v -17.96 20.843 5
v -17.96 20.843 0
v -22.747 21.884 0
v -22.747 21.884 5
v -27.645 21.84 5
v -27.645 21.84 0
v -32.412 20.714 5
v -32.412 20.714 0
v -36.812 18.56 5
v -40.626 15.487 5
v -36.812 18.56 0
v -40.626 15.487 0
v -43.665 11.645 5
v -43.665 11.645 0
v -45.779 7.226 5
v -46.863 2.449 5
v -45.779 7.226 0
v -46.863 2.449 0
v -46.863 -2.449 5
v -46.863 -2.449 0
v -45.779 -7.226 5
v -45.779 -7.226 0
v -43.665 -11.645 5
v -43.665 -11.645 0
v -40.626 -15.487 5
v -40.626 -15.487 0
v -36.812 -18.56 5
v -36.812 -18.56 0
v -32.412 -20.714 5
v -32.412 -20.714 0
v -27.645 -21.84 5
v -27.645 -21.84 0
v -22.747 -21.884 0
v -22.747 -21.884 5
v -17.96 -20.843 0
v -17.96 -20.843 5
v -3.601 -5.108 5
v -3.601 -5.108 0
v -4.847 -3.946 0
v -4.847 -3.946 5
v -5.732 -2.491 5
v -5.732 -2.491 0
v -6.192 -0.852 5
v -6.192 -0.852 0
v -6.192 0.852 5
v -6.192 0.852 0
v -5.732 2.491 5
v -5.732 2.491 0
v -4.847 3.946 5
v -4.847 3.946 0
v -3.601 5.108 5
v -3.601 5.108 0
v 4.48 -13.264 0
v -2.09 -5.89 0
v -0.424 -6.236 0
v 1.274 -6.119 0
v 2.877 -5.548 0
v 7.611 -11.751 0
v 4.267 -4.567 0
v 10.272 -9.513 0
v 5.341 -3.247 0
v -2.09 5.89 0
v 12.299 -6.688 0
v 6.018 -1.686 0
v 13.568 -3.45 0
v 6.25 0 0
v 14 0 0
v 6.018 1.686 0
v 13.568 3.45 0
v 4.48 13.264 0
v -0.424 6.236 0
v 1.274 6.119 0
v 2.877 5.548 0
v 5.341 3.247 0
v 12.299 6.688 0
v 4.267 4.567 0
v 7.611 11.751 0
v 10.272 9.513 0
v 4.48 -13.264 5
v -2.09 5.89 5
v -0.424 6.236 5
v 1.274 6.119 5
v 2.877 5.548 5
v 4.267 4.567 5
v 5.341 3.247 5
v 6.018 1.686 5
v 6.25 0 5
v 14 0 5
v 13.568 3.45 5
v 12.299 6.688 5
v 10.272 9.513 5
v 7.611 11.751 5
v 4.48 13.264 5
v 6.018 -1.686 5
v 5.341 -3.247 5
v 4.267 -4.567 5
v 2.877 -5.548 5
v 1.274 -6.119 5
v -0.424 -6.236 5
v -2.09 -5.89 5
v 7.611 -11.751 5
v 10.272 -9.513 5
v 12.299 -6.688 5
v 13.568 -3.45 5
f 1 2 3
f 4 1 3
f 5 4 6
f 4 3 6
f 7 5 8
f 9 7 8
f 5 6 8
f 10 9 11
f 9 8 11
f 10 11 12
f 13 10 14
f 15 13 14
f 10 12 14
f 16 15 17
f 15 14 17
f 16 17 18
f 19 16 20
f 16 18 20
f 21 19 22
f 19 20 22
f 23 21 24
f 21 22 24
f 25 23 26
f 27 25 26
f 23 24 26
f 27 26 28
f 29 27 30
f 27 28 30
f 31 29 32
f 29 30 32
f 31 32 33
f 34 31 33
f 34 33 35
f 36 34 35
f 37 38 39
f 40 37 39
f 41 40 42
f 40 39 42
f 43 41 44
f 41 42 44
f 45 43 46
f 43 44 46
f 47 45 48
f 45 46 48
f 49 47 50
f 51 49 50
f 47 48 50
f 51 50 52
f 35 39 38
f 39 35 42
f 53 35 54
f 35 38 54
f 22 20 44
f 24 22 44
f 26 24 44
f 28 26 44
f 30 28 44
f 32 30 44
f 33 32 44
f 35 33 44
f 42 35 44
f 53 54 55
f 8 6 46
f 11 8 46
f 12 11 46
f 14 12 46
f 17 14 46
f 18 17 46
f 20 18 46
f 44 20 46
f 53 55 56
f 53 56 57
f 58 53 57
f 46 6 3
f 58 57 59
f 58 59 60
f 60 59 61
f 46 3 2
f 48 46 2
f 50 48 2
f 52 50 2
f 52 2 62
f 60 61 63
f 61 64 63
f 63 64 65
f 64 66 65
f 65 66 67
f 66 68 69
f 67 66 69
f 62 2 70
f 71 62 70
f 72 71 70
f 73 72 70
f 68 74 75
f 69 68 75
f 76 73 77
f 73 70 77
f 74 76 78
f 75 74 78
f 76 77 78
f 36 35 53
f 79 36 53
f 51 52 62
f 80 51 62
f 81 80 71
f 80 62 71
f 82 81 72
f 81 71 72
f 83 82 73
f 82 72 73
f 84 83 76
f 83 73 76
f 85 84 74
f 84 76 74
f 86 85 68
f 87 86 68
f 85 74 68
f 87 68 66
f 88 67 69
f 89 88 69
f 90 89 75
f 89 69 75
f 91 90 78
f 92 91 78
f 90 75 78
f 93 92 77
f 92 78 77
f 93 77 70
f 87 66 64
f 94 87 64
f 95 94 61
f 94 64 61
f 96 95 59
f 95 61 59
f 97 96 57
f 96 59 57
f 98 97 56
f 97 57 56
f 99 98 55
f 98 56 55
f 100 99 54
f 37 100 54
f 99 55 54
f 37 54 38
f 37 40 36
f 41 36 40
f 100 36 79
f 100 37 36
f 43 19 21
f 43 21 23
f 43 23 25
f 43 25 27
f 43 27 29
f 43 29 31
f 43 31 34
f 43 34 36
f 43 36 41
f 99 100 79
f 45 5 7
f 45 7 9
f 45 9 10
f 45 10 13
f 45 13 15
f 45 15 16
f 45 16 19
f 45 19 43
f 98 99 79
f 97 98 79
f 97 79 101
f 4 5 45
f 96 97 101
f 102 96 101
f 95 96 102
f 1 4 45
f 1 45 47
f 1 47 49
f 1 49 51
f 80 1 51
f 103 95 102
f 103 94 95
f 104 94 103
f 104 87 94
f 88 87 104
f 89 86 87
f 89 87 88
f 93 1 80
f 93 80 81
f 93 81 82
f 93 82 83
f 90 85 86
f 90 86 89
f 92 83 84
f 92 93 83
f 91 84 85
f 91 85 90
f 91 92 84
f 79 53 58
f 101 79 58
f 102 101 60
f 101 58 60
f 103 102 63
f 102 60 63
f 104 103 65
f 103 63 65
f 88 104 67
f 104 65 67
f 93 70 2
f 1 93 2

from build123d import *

# Parameters (mm, degrees)
F1_DEPTH = 5


with BuildPart() as f1:
    # F0 (on Top) → F1 (new body)
    with BuildSketch(Plane.XY):
        with BuildLine():
            ThreePointArc((-6.74, -12.2707945953), (-14, 0), (-6.74, 12.2707945953))
            ThreePointArc((-6.74, 12.2707945953), (-11.643579322, 17.4815910795), (-17.96, 20.8431859369))
            ThreePointArc((-17.96, 20.8431859369), (-47, 0), (-17.96, -20.8431859369))
            ThreePointArc((-17.96, -20.8431859369), (-11.643579322, -17.4815910795), (-6.74, -12.2707945953))
        make_face()
        with BuildLine():
            ThreePointArc((-6.74, 12.2707945953), (-1.234276133, 13.945485378), (4.48, 13.2638455962))
            Line((4.48, 13.2638455962), (-17.96, 20.8431859369))
            ThreePointArc((-17.96, 20.8431859369), (-11.643579322, 17.4815910795), (-6.74, 12.2707945953))
        make_face()
        with BuildLine():
            ThreePointArc((-3.60125, 5.108179562), (-4.8498169631, 8.8300692851), (-6.74, 12.2707945953))
            ThreePointArc((-6.74, 12.2707945953), (-14, 0), (-6.74, -12.2707945953))
            ThreePointArc((-6.74, -12.2707945953), (-4.8498169631, -8.8300692851), (-3.60125, -5.108179562))
            ThreePointArc((-3.60125, -5.108179562), (-6.25, 0), (-3.60125, 5.108179562))
        make_face()
        with BuildLine():
            ThreePointArc((4.48, -13.2638455962), (11.3736537665, -8.1633326528), (14, 0))
            ThreePointArc((14, 0), (11.3736537665, 8.1633326528), (4.48, 13.2638455962))
            ThreePointArc((4.48, 13.2638455962), (-1.234276133, 13.945485378), (-6.74, 12.2707945953))
            ThreePointArc((-6.74, 12.2707945953), (-4.8498169631, 8.8300692851), (-3.60125, 5.108179562))
            ThreePointArc((-3.60125, 5.108179562), (2.8770373216, 5.54843728), (6.25, 0))
            ThreePointArc((6.25, 0), (2.8770373216, -5.54843728), (-3.60125, -5.108179562))
            ThreePointArc((-3.60125, -5.108179562), (-4.8498169631, -8.8300692851), (-6.74, -12.2707945953))
            ThreePointArc((-6.74, -12.2707945953), (-1.234276133, -13.945485378), (4.48, -13.2638455962))
        make_face()
        with BuildLine():
            Line((-17.96, -20.8431859369), (4.48, -13.2638455962))
            ThreePointArc((4.48, -13.2638455962), (-1.234276133, -13.945485378), (-6.74, -12.2707945953))
            ThreePointArc((-6.74, -12.2707945953), (-11.643579322, -17.4815910795), (-17.96, -20.8431859369))
        make_face()
    extrude(amount=F1_DEPTH)


solid = f1.part
